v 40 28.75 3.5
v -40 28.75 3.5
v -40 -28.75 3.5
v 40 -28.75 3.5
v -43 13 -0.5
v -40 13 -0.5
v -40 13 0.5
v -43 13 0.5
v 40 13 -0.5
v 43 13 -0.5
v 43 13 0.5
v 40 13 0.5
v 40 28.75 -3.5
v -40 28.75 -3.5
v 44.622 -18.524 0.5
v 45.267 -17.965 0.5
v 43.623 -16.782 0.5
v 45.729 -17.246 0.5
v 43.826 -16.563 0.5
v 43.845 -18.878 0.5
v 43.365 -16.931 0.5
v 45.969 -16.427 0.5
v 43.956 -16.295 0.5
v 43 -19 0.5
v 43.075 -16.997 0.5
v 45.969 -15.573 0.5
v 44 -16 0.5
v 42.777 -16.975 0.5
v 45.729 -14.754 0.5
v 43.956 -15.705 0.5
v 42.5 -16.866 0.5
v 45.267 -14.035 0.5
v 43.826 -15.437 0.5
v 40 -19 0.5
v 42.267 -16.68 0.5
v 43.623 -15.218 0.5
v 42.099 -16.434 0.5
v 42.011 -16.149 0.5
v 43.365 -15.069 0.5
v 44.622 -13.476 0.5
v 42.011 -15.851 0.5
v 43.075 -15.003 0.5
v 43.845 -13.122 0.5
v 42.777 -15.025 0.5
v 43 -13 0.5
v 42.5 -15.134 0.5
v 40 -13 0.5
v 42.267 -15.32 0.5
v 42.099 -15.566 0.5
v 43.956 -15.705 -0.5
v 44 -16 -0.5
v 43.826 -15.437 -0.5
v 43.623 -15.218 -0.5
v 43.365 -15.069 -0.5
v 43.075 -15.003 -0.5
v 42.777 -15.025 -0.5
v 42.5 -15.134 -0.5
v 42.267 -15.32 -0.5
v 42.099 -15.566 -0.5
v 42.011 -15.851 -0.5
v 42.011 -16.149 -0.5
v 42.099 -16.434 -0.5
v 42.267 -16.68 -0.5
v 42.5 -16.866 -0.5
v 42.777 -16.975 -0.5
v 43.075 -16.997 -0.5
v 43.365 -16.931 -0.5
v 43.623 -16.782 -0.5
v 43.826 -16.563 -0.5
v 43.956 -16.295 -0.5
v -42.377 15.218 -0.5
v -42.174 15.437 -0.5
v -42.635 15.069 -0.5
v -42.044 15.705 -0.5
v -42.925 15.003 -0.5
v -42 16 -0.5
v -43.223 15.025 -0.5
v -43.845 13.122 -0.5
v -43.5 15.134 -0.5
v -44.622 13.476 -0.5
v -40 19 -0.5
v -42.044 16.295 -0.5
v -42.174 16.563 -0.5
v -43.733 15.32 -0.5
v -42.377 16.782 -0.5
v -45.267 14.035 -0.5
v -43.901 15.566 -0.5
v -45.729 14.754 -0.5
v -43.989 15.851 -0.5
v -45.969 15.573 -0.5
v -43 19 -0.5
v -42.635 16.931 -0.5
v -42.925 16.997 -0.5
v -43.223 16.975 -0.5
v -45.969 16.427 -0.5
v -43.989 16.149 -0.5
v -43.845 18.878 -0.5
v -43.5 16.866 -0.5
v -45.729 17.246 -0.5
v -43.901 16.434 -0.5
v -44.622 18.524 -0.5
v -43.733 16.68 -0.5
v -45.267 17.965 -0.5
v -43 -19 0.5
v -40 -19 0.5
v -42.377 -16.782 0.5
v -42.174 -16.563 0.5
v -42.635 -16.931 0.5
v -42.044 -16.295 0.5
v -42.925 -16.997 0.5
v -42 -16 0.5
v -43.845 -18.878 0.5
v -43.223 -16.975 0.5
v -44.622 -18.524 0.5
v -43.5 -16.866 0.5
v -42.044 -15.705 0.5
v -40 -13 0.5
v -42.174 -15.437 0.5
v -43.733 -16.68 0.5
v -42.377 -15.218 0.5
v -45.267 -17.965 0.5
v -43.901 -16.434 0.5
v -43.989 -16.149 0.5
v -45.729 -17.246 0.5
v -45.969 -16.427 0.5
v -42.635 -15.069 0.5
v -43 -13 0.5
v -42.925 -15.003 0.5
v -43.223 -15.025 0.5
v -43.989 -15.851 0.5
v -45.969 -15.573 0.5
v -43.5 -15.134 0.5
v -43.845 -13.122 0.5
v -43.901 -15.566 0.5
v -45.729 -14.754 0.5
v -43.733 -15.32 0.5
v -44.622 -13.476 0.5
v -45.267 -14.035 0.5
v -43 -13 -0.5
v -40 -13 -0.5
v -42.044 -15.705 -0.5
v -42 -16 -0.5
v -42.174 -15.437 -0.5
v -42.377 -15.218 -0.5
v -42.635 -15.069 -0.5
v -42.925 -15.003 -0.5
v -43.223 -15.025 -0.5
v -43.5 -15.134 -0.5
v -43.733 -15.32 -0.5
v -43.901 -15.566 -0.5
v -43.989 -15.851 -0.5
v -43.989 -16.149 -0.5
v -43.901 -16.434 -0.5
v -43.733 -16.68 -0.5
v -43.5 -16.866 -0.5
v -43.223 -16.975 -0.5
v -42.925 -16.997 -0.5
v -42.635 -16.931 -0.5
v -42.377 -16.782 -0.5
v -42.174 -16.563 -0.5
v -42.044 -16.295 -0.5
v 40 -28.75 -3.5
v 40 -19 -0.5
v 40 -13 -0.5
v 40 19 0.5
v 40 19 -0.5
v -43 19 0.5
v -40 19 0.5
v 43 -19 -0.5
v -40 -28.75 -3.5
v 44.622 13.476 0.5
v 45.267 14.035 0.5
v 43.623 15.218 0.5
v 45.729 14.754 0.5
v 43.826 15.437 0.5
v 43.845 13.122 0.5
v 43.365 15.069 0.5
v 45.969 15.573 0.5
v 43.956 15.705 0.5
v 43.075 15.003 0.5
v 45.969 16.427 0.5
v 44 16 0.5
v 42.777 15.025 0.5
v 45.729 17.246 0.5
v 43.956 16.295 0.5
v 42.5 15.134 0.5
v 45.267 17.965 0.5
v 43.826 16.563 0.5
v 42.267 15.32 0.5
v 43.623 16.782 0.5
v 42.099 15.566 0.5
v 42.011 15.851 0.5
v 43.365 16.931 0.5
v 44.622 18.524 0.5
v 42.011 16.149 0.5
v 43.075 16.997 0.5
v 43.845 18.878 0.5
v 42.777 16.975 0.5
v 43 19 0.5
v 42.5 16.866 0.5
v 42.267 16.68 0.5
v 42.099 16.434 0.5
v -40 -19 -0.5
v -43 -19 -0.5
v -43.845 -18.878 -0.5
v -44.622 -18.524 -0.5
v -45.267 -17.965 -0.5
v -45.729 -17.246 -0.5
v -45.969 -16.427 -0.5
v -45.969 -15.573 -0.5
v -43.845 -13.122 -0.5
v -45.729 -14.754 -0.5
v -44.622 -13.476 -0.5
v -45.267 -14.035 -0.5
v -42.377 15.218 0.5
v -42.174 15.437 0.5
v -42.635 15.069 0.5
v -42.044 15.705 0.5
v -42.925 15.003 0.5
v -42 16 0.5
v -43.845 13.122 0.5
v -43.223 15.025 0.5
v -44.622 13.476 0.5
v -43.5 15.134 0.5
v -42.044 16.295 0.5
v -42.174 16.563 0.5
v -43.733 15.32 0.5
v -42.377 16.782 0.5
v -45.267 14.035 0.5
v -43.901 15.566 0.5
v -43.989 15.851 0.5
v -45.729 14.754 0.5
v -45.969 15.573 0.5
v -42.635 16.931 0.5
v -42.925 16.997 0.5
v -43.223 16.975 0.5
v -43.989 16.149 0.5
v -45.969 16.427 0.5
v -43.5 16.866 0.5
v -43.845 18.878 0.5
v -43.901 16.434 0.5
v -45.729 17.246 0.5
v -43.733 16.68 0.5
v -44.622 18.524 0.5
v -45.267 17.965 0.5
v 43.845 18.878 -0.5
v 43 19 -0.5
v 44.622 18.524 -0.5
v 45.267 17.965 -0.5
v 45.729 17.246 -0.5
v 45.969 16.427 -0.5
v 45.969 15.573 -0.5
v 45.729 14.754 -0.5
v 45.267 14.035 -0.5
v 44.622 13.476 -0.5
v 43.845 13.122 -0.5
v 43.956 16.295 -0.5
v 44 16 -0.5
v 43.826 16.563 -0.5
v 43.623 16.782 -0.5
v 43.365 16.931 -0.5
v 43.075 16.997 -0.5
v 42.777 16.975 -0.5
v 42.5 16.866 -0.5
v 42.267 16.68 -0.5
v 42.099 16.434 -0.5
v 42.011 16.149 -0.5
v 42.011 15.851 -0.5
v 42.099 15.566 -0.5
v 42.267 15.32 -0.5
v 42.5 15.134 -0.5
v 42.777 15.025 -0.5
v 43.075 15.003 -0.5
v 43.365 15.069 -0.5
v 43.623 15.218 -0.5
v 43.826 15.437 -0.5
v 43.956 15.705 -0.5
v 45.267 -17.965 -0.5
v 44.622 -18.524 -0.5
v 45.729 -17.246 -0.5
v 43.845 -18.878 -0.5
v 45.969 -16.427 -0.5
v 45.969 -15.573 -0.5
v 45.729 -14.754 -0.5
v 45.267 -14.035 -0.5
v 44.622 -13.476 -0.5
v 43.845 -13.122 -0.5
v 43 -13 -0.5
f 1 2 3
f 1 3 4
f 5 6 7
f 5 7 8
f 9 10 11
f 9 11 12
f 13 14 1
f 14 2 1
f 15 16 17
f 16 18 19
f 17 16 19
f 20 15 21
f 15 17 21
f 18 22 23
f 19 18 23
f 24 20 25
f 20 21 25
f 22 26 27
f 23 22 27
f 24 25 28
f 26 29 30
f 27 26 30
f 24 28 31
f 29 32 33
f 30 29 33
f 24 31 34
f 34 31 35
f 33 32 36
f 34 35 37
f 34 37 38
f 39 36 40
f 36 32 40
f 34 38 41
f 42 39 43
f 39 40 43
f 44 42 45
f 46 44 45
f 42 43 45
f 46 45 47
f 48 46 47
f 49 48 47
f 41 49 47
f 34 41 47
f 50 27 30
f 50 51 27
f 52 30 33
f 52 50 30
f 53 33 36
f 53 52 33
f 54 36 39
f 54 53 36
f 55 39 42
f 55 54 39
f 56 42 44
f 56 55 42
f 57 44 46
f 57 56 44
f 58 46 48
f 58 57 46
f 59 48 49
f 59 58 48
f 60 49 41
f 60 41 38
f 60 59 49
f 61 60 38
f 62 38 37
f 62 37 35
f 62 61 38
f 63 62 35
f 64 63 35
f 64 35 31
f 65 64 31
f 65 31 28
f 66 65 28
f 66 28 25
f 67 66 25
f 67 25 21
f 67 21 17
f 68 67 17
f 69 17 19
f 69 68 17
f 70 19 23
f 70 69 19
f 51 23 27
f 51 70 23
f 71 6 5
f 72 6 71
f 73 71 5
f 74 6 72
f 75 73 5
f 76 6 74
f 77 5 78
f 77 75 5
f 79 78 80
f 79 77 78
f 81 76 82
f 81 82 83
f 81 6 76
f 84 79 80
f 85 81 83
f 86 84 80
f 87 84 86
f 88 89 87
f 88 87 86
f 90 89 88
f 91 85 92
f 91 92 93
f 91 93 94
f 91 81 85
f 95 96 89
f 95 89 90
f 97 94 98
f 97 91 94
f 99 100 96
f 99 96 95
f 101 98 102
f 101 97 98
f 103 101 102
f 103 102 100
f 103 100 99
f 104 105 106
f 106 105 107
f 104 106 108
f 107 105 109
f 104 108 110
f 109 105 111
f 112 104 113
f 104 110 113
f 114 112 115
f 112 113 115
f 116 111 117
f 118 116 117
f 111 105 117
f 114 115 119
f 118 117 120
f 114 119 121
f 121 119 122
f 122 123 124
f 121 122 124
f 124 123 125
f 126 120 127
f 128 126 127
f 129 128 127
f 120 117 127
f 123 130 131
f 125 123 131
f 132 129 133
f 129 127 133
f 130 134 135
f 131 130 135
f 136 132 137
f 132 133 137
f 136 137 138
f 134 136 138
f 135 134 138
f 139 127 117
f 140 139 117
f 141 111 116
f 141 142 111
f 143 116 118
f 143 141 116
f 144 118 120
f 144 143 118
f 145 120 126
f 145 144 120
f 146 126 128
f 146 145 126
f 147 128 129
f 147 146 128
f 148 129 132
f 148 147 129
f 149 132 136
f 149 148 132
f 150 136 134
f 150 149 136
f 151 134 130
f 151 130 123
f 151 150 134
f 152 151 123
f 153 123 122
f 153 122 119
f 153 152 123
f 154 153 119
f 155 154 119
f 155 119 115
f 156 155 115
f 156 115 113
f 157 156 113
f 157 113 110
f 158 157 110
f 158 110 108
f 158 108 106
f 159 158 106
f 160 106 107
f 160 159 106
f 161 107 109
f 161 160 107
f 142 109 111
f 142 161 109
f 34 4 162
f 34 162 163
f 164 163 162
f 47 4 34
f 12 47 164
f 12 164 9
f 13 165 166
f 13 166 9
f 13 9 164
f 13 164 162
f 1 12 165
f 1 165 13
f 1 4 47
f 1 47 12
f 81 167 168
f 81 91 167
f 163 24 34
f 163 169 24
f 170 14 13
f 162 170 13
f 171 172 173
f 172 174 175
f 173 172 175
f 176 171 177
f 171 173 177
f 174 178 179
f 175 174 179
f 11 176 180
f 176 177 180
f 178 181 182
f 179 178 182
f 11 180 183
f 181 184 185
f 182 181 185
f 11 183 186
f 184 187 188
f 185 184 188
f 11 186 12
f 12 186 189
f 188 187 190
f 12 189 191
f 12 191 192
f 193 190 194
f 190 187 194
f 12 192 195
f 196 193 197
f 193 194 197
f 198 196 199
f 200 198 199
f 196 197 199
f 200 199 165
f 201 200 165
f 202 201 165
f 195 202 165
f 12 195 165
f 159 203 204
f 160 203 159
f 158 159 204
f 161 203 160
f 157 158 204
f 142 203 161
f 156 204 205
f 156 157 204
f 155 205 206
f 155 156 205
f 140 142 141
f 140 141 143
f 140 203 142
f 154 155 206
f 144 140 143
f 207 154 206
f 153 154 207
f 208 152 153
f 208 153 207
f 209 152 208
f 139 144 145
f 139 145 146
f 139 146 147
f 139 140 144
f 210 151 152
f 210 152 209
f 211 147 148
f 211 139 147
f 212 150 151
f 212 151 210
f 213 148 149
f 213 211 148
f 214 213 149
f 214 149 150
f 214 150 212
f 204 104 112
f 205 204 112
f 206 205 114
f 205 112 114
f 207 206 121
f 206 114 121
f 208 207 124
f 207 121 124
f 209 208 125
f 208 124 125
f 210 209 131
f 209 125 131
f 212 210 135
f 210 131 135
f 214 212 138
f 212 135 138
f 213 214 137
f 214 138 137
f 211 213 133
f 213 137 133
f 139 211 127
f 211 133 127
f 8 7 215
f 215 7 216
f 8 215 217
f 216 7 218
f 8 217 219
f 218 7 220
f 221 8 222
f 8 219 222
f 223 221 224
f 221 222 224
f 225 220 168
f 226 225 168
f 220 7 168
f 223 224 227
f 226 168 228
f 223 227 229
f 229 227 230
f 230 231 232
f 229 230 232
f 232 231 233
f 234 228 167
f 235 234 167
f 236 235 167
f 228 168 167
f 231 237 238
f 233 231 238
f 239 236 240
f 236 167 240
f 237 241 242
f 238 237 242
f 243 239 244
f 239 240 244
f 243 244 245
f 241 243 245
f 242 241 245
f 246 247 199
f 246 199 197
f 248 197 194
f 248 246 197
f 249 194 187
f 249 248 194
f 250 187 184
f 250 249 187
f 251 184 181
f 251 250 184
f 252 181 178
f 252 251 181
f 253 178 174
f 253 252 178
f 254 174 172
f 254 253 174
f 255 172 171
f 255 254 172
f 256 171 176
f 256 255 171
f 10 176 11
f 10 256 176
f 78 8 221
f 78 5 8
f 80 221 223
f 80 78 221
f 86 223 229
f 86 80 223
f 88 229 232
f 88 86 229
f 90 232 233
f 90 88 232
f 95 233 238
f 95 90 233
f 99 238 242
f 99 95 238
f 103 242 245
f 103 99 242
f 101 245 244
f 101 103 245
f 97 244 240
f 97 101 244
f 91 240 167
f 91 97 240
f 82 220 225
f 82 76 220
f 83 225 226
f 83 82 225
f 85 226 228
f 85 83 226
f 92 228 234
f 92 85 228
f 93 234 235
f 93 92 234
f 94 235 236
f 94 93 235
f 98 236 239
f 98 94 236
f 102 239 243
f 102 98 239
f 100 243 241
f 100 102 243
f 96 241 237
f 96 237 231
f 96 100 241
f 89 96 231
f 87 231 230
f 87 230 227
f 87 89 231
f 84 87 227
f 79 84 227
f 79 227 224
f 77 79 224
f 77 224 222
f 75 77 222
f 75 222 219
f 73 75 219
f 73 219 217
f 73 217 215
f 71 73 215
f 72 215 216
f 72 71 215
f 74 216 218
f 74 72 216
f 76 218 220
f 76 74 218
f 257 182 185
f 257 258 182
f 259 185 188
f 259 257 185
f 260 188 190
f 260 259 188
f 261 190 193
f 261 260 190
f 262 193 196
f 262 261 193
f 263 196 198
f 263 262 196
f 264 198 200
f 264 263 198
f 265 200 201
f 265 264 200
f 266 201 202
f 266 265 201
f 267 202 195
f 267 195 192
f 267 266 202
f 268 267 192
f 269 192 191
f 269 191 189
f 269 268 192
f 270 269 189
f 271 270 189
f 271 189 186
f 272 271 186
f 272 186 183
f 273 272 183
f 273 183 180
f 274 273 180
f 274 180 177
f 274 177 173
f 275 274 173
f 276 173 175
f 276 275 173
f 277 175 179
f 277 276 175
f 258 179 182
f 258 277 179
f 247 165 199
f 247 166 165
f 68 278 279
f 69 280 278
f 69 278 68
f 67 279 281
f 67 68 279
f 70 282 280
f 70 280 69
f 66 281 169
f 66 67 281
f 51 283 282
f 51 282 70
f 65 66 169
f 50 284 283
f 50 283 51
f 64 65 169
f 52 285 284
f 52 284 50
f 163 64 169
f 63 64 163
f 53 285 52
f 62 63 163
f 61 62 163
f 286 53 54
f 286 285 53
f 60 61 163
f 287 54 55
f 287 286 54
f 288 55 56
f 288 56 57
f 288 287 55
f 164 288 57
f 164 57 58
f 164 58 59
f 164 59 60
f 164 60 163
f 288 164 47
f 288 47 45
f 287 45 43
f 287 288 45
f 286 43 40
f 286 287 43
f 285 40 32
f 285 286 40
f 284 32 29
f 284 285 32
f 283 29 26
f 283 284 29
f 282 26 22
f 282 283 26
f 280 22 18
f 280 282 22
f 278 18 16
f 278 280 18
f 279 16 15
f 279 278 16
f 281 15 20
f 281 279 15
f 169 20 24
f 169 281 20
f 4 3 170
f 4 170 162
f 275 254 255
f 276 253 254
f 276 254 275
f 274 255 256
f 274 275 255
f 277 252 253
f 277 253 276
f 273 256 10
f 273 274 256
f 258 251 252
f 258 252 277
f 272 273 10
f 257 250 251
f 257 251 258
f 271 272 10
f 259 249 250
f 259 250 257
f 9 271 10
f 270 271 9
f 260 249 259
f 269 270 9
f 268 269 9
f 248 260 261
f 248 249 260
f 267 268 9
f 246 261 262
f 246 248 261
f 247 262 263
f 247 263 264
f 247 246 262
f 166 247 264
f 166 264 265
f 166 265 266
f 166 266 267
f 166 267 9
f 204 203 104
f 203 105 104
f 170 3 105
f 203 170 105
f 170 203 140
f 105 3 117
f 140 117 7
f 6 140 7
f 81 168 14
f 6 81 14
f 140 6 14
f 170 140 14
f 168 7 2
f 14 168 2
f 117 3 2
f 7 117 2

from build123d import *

# Parameters (mm, degrees)
SKETCH1_W           = 80
SKETCH1_H           = 57.5
BOSS_EXTRUDE1_DEPTH = 3.5
SKETCH3_R           = 1
BOSS_EXTRUDE2_DEPTH = 0.5


with BuildPart() as part:
    # Sketch1 → Boss-Extrude1 (new, symmetric)
    with BuildSketch(Plane.XY):
        Rectangle(SKETCH1_W, SKETCH1_H)
    extrude(amount=BOSS_EXTRUDE1_DEPTH, both=True)

    # Sketch3 → Boss-Extrude2 (add, symmetric)
    # profile 1 of 4: a face of its own
    with BuildSketch(Plane.XY):
        with BuildLine():
            Line((40, 19), (43, 19))
            ThreePointArc((43, 19), (46, 16), (43, 13))
            Line((43, 13), (40, 13))
            Line((40, 13), (40, 19))
        make_face()
        with Locations((43, 16)):
            Circle(SKETCH3_R, mode=Mode.SUBTRACT)
    # profile 2 of 4: a face of its own
    with BuildSketch(Plane.XY):
        with BuildLine():
            Line((43, -19), (40, -19))
            Line((40, -19), (40, -13))
            Line((40, -13), (43, -13))
            ThreePointArc((43, -13), (46, -16), (43, -19))
        make_face()
        with Locations((43, -16)):
            Circle(SKETCH3_R, mode=Mode.SUBTRACT)
    # profile 3 of 4: a face of its own
    with BuildSketch(Plane.XY):
        with BuildLine():
            Line((-43, 19), (-40, 19))
            Line((-40, 19), (-40, 13))
            Line((-40, 13), (-43, 13))
            ThreePointArc((-43, 13), (-46, 16), (-43, 19))
        make_face()
        with Locations((-43, 16)):
            Circle(SKETCH3_R, mode=Mode.SUBTRACT)
    # profile 4 of 4: a face of its own
    with BuildSketch(Plane.XY):
        with BuildLine():
            Line((-43, -13), (-40, -13))
            Line((-40, -13), (-40, -19))
            Line((-40, -19), (-43, -19))
            ThreePointArc((-43, -19), (-46, -16), (-43, -13))
        make_face()
        with Locations((-43, -16)):
            Circle(SKETCH3_R, mode=Mode.SUBTRACT)
    extrude(amount=BOSS_EXTRUDE2_DEPTH, both=True)


solid = part.part
